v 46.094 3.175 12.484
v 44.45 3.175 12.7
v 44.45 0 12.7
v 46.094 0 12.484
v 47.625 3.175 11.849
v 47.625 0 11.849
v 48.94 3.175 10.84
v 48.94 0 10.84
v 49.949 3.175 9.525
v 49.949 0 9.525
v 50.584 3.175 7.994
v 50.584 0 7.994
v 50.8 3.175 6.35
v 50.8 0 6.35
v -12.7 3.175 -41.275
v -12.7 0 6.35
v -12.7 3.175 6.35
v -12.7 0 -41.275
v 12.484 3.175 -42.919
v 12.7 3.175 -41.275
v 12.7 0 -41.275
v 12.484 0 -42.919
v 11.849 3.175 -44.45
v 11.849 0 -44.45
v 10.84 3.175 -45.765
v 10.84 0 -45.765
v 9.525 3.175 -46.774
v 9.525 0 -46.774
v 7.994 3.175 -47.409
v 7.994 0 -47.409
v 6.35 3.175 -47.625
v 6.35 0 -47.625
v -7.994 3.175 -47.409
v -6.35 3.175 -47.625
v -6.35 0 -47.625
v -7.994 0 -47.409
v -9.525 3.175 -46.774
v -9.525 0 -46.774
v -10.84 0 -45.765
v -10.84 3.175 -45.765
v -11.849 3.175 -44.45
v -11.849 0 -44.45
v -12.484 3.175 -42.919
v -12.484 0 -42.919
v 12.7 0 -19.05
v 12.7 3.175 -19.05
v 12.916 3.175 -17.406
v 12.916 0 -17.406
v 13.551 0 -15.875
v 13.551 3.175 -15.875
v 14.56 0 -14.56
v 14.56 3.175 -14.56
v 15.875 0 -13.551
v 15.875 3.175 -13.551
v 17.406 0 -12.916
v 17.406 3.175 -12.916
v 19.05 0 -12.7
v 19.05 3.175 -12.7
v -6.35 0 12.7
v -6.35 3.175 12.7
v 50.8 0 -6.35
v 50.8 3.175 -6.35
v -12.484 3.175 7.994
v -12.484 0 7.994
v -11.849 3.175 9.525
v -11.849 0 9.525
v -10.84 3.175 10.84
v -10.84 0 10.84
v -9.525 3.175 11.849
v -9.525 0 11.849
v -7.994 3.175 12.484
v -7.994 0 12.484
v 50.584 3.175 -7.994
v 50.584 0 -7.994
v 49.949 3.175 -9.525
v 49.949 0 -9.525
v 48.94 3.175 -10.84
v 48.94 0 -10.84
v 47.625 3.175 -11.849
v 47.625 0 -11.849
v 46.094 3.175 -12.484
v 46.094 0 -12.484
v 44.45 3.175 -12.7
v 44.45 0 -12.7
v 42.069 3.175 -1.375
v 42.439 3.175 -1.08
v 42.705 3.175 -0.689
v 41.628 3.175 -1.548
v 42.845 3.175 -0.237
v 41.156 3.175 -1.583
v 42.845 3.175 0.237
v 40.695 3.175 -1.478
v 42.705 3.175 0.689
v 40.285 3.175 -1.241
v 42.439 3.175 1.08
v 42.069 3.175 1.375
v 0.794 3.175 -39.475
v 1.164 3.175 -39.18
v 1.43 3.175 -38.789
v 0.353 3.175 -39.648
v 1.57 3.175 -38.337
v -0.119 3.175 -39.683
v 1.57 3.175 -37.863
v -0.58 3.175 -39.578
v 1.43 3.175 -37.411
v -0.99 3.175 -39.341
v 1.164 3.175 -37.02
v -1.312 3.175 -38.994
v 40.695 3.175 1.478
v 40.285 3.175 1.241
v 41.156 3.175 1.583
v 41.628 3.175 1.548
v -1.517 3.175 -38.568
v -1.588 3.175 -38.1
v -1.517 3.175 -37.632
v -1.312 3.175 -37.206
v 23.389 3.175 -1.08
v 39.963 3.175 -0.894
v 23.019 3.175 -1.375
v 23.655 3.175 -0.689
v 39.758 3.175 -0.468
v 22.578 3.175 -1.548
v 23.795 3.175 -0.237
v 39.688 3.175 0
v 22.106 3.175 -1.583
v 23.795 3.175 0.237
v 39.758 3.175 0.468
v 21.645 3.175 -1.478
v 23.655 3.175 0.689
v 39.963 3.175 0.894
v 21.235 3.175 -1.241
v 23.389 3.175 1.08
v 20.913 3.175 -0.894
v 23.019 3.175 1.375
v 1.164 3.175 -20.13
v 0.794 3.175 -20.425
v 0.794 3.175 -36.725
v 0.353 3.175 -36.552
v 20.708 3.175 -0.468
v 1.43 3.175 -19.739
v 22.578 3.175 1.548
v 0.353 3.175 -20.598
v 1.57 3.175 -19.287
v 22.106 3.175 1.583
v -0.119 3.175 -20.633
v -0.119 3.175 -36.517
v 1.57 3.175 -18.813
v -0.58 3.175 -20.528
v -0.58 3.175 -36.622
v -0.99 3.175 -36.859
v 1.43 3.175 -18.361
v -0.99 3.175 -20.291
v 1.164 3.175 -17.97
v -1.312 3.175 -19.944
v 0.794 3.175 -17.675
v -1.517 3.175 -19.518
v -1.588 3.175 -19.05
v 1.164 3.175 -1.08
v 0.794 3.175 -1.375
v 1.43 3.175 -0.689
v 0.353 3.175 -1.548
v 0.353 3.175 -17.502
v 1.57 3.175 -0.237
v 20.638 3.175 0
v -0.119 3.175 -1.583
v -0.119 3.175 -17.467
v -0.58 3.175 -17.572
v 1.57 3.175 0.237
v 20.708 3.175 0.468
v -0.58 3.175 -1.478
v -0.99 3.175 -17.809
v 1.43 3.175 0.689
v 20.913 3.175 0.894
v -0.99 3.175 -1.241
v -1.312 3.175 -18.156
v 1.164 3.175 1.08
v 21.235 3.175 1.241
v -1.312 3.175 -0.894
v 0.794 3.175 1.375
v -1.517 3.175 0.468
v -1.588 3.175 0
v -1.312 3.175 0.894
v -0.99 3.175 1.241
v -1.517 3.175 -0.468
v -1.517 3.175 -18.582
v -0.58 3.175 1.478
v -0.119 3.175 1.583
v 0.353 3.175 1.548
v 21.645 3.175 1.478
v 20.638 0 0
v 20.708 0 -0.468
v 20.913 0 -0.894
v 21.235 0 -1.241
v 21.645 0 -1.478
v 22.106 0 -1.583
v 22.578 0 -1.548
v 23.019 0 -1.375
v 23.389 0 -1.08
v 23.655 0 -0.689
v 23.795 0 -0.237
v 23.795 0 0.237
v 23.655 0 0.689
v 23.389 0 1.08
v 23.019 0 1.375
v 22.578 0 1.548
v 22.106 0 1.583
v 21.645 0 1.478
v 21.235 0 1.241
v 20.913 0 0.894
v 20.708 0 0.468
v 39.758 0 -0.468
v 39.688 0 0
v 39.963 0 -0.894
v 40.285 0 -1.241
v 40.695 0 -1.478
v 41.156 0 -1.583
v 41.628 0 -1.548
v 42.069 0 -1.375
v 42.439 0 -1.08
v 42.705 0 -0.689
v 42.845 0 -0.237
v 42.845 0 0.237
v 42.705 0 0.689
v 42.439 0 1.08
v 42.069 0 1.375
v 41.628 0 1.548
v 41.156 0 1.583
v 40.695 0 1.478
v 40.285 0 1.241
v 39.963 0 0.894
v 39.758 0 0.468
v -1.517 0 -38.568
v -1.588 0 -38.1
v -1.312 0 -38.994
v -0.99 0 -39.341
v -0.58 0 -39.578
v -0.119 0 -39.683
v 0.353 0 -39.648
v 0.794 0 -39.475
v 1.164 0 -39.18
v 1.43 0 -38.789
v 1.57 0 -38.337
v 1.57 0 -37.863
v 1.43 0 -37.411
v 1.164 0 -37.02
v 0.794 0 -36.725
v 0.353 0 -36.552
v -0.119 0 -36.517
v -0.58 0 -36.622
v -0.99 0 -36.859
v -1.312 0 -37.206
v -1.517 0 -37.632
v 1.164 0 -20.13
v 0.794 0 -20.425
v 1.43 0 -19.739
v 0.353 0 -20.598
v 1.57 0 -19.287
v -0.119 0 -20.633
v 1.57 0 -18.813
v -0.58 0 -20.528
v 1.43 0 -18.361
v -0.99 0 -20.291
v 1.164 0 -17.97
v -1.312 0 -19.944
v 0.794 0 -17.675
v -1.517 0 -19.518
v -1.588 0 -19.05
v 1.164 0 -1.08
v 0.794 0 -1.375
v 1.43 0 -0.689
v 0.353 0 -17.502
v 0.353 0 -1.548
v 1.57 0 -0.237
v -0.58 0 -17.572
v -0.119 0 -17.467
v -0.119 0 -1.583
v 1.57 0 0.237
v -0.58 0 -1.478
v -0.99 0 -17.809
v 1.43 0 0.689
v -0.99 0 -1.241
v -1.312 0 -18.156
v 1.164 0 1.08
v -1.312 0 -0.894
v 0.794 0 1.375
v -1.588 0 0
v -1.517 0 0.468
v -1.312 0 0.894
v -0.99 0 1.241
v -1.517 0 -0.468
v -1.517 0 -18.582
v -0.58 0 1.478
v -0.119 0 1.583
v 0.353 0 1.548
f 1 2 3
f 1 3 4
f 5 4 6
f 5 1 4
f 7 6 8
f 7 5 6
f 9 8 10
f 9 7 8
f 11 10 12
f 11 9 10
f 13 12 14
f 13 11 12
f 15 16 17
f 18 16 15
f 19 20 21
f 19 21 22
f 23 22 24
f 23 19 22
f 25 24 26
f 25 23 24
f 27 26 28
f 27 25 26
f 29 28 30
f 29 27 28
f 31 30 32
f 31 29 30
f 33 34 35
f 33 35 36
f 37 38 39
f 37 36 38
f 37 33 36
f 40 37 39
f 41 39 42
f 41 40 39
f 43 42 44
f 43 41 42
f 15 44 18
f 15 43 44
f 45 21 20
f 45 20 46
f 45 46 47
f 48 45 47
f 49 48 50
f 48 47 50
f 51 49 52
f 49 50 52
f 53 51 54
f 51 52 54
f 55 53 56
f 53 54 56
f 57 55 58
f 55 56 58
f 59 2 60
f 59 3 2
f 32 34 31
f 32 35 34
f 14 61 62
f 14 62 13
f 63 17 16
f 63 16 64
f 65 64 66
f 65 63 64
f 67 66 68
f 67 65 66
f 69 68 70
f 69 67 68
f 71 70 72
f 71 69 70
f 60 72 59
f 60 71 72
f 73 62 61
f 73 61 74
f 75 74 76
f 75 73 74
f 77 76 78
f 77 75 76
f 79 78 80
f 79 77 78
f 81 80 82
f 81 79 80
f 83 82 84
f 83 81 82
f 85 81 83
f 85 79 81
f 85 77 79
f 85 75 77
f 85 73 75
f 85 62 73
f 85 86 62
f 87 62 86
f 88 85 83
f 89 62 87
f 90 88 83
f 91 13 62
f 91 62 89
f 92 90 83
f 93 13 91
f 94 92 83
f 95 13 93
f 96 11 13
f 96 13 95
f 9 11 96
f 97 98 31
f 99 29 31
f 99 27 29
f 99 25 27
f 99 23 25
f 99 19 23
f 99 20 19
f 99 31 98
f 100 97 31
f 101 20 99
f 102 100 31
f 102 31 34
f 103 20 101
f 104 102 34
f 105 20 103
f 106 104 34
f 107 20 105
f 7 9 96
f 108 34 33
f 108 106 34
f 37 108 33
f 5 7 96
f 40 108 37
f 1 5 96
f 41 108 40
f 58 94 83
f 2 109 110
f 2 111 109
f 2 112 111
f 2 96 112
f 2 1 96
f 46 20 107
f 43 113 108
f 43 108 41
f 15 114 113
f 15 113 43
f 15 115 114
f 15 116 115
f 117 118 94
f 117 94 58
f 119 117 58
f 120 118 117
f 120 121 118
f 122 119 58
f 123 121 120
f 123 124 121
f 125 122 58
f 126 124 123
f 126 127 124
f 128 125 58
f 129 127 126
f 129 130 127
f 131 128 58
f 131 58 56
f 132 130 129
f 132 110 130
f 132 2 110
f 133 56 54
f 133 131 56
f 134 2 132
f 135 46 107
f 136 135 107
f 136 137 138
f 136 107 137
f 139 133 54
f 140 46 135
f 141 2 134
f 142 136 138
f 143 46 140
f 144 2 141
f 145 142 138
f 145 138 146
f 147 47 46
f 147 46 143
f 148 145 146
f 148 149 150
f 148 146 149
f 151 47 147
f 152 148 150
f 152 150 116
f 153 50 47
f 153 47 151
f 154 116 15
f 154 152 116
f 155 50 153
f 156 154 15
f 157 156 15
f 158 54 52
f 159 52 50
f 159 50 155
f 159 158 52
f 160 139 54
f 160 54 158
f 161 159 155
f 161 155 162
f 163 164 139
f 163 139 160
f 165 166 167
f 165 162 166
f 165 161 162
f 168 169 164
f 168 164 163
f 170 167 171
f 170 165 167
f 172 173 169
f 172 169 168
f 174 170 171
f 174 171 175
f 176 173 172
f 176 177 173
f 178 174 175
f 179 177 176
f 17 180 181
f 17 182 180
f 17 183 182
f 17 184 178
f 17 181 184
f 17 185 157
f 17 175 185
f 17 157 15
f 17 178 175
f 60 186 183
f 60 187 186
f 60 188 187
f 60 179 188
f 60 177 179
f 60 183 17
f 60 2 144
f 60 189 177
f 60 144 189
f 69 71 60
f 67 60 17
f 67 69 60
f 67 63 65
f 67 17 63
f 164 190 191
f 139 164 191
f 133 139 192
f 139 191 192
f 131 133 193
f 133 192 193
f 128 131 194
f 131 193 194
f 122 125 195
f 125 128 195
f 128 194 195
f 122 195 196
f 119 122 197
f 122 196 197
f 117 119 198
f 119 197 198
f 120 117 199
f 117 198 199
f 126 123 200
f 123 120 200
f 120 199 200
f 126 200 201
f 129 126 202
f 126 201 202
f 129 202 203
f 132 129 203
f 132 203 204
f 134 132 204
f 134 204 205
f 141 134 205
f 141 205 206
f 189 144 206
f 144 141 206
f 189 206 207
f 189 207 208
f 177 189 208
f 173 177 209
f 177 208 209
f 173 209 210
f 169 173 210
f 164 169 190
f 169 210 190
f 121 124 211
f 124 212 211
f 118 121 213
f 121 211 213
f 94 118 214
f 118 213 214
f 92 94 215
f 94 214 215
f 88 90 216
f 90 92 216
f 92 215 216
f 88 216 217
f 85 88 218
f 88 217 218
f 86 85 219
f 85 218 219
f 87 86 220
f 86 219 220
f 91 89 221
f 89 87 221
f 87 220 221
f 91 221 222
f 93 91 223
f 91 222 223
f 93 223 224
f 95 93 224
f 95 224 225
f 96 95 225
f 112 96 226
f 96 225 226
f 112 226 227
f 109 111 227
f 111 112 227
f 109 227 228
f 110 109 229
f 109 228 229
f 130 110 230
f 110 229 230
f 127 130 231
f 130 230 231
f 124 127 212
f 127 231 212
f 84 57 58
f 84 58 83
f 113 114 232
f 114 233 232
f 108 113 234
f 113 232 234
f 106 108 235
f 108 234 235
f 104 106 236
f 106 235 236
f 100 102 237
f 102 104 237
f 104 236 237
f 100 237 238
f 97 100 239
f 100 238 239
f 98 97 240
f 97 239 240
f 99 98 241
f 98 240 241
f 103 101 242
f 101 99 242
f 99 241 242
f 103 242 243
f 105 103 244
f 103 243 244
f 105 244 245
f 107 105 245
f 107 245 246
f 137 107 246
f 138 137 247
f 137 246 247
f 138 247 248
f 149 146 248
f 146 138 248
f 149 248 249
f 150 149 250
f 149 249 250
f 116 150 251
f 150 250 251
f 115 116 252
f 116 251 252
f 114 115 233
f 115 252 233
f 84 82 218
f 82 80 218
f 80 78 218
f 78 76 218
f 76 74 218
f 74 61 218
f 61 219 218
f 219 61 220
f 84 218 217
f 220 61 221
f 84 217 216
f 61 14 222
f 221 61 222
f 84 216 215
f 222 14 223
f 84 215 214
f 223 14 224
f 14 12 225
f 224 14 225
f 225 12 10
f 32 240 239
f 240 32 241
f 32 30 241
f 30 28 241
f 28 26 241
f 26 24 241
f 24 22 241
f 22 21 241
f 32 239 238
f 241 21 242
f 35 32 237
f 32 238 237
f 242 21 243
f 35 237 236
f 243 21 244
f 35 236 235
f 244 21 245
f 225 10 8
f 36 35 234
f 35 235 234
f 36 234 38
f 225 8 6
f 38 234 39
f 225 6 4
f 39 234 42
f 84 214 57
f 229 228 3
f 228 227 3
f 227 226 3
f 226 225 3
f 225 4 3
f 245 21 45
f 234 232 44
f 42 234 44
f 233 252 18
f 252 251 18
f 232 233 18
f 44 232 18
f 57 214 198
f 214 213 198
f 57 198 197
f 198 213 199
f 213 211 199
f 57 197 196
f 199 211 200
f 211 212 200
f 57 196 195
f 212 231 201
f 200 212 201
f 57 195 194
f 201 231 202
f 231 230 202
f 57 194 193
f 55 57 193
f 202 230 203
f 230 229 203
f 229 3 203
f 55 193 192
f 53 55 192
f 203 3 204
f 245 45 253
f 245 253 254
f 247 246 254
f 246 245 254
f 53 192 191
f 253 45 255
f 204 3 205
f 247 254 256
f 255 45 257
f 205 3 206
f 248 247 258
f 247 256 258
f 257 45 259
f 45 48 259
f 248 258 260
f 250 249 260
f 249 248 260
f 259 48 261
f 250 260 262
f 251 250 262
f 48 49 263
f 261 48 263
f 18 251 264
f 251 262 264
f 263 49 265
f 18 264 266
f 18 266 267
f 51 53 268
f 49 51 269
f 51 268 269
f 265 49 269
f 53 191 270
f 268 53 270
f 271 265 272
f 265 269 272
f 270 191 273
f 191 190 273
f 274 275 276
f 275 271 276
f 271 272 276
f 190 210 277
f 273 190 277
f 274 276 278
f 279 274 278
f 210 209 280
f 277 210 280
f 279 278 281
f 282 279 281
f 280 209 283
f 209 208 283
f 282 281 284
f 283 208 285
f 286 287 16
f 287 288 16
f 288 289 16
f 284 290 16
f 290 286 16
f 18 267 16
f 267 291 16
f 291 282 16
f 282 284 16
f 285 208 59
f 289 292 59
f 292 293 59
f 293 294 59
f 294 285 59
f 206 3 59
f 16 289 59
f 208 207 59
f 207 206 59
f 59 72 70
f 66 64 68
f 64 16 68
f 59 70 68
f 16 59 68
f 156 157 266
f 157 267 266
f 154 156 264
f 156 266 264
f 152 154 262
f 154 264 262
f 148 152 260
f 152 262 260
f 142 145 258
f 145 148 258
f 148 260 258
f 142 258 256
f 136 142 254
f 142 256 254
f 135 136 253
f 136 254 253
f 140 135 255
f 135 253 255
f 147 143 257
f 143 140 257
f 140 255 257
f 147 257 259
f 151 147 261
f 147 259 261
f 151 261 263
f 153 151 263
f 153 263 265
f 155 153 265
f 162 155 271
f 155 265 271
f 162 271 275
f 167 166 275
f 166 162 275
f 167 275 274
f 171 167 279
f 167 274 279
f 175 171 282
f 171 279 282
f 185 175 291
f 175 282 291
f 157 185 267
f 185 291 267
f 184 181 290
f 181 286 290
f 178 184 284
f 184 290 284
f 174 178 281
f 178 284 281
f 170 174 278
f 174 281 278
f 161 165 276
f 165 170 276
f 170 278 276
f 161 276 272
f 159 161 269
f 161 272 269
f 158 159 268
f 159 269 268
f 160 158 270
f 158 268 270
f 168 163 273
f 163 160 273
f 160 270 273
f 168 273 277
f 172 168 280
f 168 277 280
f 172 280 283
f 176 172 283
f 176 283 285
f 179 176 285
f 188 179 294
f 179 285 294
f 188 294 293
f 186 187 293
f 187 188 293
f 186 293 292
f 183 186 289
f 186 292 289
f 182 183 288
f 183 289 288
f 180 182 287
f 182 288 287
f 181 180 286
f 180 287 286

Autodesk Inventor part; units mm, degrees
ref_plane "YZ Plane" through (0, 0, 0) normal (1, 0, 0) x (0, 1, 0)
ref_plane "XZ Plane" through (0, 0, 0) normal (0, 1, 0) x (-1, 0, 0)
ref_plane "XY Plane" through (0, 0, 0) normal (0, 0, 1) x (1, 0, 0)
sketch "Sketch1" plane through (0, 0, 0) normal (0, 1, 0) x (-1, 0, 0)
  circle A0 centre (0, 0) radius 1.5875
  line L0 (0, 0) -> (0, -38.1) construction
  circle A1 centre (-22.225, 0) radius 1.5875
  circle A2 centre (-41.275, 0) radius 1.5875
  circle A3 centre (0, -19.05) radius 1.5875
  circle A4 centre (0, -38.1) radius 1.5875
  line L1 (-12.7, -12.7) -> (-50.8, -12.7)
  line L2 (-50.8, -12.7) -> (-50.8, 12.7)
  line L3 (-50.8, 12.7) -> (12.7, 12.7)
  line L4 (12.7, 12.7) -> (12.7, -47.625)
  line L5 (12.7, -47.625) -> (-12.7, -47.625)
  line L6 (-12.7, -47.625) -> (-12.7, -12.7)
  line L7 (0, -38.1) -> (0, -47.625) construction
  line L8 (-41.275, 0) -> (-50.8, 0) construction
  line L9 (-12.7, -12.7) -> (-12.7, 12.7) construction
  line L10 (0, 0) -> (-41.275, 0) construction
  dimension "d0" = 3.175
  dimension "d1" = 22.225
  dimension "d2" = 25.4
  dimension "d3" = 9.525
  dimension "d4" = 19.05
  dimension "d5" = 19.05
extrude "Extrusion1" add sketch "Sketch1" along normal blind 3.175
fillet "Fillet1" radius 6.35 6 edges at (50.8, 1.5875, 12.7) (50.8, 1.5875, -12.7) (12.7, 1.5875, -47.625) (-12.7, 1.5875, -47.625) (-12.7, 1.5875, 12.7) (12.7, 1.5875, -12.7)
properties part number "plate" material "Aluminum 6061"
